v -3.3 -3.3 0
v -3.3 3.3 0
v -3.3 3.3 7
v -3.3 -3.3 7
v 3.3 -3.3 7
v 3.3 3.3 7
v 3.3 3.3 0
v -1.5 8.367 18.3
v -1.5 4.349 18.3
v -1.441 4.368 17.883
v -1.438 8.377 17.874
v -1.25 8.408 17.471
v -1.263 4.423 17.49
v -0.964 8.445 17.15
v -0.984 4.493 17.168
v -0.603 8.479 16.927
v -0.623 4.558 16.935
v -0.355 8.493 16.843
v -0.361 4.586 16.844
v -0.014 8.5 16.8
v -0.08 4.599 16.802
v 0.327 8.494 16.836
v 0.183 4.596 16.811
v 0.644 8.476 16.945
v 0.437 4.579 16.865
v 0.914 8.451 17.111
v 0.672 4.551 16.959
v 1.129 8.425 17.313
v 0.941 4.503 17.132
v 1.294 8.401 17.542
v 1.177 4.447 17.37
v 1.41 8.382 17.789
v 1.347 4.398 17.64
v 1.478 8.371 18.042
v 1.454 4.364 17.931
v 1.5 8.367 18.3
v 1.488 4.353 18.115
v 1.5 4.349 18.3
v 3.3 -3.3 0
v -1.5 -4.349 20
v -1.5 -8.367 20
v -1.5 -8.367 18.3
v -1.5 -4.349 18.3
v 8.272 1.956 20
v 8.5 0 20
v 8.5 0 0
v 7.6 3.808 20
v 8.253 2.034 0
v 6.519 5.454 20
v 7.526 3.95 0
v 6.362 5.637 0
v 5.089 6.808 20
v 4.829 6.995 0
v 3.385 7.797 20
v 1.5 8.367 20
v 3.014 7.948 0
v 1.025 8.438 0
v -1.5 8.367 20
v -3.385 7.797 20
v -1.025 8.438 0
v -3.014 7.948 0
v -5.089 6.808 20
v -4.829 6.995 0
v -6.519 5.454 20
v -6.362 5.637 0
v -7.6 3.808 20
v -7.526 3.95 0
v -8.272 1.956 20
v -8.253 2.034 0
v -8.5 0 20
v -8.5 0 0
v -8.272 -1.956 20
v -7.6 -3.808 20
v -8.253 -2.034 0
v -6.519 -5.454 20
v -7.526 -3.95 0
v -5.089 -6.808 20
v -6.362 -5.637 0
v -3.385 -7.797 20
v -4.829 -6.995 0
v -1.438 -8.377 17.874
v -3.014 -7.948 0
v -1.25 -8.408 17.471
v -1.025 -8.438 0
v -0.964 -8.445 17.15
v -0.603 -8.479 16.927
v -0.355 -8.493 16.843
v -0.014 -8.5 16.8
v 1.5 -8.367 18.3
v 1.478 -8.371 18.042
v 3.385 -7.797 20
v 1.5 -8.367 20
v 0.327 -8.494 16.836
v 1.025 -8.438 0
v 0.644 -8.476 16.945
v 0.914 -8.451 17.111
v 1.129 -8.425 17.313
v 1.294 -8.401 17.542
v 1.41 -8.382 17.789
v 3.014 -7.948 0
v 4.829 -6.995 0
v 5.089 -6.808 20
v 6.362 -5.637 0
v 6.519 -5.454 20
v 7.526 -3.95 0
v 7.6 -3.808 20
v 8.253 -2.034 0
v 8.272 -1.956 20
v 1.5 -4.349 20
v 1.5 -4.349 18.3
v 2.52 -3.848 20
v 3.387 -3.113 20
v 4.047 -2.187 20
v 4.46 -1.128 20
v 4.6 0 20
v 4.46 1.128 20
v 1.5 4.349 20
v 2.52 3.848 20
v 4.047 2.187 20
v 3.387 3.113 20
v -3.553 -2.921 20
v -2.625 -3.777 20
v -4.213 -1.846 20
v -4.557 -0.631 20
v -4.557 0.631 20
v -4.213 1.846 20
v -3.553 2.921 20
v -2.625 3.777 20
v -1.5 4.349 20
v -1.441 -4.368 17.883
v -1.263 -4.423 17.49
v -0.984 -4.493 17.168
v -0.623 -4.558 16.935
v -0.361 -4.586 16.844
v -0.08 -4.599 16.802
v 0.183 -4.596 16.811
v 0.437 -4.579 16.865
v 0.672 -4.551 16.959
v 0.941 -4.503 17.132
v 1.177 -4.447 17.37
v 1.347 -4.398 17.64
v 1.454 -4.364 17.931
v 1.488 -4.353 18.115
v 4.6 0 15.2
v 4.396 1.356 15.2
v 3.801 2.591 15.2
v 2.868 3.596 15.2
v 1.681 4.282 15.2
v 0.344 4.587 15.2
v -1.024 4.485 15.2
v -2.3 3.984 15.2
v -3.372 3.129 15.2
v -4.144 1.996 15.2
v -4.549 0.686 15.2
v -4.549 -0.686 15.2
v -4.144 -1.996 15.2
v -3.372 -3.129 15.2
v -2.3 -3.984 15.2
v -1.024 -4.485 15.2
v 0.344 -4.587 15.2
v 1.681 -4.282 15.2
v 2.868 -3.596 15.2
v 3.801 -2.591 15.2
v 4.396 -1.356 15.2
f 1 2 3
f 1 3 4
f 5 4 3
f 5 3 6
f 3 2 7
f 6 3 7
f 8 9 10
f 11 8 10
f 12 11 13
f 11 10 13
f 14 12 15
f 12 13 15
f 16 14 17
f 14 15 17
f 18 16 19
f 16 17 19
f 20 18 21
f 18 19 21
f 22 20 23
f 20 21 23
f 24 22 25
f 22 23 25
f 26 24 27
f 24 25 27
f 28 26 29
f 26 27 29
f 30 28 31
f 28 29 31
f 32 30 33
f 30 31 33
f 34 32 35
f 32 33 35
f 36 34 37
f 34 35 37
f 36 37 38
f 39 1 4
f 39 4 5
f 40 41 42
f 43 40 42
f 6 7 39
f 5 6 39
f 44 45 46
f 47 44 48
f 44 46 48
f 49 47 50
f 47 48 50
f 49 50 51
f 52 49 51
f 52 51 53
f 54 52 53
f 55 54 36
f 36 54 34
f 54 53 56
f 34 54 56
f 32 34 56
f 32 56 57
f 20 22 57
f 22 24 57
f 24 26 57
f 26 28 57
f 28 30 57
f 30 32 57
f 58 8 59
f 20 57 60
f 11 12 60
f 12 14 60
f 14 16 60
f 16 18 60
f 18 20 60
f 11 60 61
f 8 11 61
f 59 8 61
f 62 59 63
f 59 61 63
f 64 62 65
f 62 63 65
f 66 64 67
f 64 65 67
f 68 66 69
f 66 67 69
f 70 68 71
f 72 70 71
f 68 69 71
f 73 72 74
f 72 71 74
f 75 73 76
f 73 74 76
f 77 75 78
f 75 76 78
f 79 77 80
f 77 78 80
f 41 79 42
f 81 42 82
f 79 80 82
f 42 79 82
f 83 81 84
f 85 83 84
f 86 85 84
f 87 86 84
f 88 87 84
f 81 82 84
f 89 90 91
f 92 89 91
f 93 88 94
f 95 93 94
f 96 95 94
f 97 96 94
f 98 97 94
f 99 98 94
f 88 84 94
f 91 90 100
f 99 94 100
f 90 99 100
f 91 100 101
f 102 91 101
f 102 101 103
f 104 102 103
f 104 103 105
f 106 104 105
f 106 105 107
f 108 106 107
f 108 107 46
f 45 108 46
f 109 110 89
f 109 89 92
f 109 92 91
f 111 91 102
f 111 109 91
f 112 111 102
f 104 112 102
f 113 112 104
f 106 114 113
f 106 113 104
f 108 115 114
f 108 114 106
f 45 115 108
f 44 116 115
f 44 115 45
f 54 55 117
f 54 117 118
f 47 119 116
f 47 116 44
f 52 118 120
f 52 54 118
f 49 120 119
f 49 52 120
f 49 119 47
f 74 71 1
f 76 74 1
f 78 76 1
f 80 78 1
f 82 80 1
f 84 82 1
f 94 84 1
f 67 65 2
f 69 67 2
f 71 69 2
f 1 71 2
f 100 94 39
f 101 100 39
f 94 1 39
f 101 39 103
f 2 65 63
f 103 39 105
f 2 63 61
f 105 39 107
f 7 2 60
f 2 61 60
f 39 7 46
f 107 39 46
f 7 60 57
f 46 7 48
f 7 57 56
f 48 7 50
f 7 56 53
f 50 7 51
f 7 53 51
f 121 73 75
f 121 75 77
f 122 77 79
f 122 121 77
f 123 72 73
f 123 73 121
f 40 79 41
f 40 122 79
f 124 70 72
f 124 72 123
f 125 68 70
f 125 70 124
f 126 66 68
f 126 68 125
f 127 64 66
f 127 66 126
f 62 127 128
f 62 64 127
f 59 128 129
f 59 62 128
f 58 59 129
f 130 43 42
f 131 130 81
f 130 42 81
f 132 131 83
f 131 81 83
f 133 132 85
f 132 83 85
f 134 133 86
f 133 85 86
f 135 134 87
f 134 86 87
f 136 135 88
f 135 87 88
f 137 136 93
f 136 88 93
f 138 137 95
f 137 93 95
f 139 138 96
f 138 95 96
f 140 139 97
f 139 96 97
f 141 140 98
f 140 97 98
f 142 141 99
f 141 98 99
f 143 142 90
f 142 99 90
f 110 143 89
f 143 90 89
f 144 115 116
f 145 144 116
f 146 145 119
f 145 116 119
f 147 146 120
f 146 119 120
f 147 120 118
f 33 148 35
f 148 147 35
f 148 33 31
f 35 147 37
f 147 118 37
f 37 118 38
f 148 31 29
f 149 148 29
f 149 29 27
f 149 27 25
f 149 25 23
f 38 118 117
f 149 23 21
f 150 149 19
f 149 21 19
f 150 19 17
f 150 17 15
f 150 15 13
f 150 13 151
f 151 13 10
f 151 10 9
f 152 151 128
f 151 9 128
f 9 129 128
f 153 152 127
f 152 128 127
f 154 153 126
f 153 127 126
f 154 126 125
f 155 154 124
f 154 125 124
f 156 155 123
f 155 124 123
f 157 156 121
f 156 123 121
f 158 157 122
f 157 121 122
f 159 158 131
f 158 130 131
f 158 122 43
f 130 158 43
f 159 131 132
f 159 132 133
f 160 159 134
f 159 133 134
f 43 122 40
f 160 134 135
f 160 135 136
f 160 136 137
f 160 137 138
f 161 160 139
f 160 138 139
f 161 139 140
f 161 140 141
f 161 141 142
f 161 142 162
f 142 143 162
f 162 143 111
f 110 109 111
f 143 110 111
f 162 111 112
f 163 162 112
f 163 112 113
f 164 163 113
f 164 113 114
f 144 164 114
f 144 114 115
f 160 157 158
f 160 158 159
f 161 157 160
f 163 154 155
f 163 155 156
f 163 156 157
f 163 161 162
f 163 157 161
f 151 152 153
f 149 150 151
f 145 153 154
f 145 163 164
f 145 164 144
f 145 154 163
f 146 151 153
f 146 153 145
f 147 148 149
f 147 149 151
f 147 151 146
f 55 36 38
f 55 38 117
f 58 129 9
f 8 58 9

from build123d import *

# Parameters (mm, degrees)
F0_R     = 8.5
F1_DEPTH = 20
F2_R     = 4.6
F3_DEPTH = 4.8
F5_DEPTH = 12.5
F6_W     = 6.6
F6_H     = 6.6
F7_DEPTH = 7


with BuildPart() as f1:
    # F0 (on Top) → F1 (new body)
    with BuildSketch(Plane.XY):
        Circle(F0_R)
    extrude(amount=F1_DEPTH)

    # F2 (on face) → F3 (cut)
    with BuildSketch(Plane.XY.offset(20)):
        Circle(F2_R)
    extrude(amount=-F3_DEPTH, mode=Mode.SUBTRACT)

    # F4 (on Front) → F5 (cut, symmetric)
    with BuildSketch(Plane.XZ):
        with BuildLine():
            Line((-1.5, 20), (-1.5, 18.3))
            ThreePointArc((-1.5, 18.3), (0, 16.8), (1.5, 18.3))
            Line((1.5, 18.3), (1.5, 20))
            Line((1.5, 20), (-1.5, 20))
        make_face()
    extrude(amount=F5_DEPTH, both=True, mode=Mode.SUBTRACT)

    # F6 (on face) → F7 (cut)
    with BuildSketch(Plane(origin=(0, 0, 0), x_dir=(1, 0, 0), z_dir=(0, 0, -1))):
        Rectangle(F6_W, F6_H)
    extrude(amount=-F7_DEPTH, mode=Mode.SUBTRACT)


solid = f1.part
